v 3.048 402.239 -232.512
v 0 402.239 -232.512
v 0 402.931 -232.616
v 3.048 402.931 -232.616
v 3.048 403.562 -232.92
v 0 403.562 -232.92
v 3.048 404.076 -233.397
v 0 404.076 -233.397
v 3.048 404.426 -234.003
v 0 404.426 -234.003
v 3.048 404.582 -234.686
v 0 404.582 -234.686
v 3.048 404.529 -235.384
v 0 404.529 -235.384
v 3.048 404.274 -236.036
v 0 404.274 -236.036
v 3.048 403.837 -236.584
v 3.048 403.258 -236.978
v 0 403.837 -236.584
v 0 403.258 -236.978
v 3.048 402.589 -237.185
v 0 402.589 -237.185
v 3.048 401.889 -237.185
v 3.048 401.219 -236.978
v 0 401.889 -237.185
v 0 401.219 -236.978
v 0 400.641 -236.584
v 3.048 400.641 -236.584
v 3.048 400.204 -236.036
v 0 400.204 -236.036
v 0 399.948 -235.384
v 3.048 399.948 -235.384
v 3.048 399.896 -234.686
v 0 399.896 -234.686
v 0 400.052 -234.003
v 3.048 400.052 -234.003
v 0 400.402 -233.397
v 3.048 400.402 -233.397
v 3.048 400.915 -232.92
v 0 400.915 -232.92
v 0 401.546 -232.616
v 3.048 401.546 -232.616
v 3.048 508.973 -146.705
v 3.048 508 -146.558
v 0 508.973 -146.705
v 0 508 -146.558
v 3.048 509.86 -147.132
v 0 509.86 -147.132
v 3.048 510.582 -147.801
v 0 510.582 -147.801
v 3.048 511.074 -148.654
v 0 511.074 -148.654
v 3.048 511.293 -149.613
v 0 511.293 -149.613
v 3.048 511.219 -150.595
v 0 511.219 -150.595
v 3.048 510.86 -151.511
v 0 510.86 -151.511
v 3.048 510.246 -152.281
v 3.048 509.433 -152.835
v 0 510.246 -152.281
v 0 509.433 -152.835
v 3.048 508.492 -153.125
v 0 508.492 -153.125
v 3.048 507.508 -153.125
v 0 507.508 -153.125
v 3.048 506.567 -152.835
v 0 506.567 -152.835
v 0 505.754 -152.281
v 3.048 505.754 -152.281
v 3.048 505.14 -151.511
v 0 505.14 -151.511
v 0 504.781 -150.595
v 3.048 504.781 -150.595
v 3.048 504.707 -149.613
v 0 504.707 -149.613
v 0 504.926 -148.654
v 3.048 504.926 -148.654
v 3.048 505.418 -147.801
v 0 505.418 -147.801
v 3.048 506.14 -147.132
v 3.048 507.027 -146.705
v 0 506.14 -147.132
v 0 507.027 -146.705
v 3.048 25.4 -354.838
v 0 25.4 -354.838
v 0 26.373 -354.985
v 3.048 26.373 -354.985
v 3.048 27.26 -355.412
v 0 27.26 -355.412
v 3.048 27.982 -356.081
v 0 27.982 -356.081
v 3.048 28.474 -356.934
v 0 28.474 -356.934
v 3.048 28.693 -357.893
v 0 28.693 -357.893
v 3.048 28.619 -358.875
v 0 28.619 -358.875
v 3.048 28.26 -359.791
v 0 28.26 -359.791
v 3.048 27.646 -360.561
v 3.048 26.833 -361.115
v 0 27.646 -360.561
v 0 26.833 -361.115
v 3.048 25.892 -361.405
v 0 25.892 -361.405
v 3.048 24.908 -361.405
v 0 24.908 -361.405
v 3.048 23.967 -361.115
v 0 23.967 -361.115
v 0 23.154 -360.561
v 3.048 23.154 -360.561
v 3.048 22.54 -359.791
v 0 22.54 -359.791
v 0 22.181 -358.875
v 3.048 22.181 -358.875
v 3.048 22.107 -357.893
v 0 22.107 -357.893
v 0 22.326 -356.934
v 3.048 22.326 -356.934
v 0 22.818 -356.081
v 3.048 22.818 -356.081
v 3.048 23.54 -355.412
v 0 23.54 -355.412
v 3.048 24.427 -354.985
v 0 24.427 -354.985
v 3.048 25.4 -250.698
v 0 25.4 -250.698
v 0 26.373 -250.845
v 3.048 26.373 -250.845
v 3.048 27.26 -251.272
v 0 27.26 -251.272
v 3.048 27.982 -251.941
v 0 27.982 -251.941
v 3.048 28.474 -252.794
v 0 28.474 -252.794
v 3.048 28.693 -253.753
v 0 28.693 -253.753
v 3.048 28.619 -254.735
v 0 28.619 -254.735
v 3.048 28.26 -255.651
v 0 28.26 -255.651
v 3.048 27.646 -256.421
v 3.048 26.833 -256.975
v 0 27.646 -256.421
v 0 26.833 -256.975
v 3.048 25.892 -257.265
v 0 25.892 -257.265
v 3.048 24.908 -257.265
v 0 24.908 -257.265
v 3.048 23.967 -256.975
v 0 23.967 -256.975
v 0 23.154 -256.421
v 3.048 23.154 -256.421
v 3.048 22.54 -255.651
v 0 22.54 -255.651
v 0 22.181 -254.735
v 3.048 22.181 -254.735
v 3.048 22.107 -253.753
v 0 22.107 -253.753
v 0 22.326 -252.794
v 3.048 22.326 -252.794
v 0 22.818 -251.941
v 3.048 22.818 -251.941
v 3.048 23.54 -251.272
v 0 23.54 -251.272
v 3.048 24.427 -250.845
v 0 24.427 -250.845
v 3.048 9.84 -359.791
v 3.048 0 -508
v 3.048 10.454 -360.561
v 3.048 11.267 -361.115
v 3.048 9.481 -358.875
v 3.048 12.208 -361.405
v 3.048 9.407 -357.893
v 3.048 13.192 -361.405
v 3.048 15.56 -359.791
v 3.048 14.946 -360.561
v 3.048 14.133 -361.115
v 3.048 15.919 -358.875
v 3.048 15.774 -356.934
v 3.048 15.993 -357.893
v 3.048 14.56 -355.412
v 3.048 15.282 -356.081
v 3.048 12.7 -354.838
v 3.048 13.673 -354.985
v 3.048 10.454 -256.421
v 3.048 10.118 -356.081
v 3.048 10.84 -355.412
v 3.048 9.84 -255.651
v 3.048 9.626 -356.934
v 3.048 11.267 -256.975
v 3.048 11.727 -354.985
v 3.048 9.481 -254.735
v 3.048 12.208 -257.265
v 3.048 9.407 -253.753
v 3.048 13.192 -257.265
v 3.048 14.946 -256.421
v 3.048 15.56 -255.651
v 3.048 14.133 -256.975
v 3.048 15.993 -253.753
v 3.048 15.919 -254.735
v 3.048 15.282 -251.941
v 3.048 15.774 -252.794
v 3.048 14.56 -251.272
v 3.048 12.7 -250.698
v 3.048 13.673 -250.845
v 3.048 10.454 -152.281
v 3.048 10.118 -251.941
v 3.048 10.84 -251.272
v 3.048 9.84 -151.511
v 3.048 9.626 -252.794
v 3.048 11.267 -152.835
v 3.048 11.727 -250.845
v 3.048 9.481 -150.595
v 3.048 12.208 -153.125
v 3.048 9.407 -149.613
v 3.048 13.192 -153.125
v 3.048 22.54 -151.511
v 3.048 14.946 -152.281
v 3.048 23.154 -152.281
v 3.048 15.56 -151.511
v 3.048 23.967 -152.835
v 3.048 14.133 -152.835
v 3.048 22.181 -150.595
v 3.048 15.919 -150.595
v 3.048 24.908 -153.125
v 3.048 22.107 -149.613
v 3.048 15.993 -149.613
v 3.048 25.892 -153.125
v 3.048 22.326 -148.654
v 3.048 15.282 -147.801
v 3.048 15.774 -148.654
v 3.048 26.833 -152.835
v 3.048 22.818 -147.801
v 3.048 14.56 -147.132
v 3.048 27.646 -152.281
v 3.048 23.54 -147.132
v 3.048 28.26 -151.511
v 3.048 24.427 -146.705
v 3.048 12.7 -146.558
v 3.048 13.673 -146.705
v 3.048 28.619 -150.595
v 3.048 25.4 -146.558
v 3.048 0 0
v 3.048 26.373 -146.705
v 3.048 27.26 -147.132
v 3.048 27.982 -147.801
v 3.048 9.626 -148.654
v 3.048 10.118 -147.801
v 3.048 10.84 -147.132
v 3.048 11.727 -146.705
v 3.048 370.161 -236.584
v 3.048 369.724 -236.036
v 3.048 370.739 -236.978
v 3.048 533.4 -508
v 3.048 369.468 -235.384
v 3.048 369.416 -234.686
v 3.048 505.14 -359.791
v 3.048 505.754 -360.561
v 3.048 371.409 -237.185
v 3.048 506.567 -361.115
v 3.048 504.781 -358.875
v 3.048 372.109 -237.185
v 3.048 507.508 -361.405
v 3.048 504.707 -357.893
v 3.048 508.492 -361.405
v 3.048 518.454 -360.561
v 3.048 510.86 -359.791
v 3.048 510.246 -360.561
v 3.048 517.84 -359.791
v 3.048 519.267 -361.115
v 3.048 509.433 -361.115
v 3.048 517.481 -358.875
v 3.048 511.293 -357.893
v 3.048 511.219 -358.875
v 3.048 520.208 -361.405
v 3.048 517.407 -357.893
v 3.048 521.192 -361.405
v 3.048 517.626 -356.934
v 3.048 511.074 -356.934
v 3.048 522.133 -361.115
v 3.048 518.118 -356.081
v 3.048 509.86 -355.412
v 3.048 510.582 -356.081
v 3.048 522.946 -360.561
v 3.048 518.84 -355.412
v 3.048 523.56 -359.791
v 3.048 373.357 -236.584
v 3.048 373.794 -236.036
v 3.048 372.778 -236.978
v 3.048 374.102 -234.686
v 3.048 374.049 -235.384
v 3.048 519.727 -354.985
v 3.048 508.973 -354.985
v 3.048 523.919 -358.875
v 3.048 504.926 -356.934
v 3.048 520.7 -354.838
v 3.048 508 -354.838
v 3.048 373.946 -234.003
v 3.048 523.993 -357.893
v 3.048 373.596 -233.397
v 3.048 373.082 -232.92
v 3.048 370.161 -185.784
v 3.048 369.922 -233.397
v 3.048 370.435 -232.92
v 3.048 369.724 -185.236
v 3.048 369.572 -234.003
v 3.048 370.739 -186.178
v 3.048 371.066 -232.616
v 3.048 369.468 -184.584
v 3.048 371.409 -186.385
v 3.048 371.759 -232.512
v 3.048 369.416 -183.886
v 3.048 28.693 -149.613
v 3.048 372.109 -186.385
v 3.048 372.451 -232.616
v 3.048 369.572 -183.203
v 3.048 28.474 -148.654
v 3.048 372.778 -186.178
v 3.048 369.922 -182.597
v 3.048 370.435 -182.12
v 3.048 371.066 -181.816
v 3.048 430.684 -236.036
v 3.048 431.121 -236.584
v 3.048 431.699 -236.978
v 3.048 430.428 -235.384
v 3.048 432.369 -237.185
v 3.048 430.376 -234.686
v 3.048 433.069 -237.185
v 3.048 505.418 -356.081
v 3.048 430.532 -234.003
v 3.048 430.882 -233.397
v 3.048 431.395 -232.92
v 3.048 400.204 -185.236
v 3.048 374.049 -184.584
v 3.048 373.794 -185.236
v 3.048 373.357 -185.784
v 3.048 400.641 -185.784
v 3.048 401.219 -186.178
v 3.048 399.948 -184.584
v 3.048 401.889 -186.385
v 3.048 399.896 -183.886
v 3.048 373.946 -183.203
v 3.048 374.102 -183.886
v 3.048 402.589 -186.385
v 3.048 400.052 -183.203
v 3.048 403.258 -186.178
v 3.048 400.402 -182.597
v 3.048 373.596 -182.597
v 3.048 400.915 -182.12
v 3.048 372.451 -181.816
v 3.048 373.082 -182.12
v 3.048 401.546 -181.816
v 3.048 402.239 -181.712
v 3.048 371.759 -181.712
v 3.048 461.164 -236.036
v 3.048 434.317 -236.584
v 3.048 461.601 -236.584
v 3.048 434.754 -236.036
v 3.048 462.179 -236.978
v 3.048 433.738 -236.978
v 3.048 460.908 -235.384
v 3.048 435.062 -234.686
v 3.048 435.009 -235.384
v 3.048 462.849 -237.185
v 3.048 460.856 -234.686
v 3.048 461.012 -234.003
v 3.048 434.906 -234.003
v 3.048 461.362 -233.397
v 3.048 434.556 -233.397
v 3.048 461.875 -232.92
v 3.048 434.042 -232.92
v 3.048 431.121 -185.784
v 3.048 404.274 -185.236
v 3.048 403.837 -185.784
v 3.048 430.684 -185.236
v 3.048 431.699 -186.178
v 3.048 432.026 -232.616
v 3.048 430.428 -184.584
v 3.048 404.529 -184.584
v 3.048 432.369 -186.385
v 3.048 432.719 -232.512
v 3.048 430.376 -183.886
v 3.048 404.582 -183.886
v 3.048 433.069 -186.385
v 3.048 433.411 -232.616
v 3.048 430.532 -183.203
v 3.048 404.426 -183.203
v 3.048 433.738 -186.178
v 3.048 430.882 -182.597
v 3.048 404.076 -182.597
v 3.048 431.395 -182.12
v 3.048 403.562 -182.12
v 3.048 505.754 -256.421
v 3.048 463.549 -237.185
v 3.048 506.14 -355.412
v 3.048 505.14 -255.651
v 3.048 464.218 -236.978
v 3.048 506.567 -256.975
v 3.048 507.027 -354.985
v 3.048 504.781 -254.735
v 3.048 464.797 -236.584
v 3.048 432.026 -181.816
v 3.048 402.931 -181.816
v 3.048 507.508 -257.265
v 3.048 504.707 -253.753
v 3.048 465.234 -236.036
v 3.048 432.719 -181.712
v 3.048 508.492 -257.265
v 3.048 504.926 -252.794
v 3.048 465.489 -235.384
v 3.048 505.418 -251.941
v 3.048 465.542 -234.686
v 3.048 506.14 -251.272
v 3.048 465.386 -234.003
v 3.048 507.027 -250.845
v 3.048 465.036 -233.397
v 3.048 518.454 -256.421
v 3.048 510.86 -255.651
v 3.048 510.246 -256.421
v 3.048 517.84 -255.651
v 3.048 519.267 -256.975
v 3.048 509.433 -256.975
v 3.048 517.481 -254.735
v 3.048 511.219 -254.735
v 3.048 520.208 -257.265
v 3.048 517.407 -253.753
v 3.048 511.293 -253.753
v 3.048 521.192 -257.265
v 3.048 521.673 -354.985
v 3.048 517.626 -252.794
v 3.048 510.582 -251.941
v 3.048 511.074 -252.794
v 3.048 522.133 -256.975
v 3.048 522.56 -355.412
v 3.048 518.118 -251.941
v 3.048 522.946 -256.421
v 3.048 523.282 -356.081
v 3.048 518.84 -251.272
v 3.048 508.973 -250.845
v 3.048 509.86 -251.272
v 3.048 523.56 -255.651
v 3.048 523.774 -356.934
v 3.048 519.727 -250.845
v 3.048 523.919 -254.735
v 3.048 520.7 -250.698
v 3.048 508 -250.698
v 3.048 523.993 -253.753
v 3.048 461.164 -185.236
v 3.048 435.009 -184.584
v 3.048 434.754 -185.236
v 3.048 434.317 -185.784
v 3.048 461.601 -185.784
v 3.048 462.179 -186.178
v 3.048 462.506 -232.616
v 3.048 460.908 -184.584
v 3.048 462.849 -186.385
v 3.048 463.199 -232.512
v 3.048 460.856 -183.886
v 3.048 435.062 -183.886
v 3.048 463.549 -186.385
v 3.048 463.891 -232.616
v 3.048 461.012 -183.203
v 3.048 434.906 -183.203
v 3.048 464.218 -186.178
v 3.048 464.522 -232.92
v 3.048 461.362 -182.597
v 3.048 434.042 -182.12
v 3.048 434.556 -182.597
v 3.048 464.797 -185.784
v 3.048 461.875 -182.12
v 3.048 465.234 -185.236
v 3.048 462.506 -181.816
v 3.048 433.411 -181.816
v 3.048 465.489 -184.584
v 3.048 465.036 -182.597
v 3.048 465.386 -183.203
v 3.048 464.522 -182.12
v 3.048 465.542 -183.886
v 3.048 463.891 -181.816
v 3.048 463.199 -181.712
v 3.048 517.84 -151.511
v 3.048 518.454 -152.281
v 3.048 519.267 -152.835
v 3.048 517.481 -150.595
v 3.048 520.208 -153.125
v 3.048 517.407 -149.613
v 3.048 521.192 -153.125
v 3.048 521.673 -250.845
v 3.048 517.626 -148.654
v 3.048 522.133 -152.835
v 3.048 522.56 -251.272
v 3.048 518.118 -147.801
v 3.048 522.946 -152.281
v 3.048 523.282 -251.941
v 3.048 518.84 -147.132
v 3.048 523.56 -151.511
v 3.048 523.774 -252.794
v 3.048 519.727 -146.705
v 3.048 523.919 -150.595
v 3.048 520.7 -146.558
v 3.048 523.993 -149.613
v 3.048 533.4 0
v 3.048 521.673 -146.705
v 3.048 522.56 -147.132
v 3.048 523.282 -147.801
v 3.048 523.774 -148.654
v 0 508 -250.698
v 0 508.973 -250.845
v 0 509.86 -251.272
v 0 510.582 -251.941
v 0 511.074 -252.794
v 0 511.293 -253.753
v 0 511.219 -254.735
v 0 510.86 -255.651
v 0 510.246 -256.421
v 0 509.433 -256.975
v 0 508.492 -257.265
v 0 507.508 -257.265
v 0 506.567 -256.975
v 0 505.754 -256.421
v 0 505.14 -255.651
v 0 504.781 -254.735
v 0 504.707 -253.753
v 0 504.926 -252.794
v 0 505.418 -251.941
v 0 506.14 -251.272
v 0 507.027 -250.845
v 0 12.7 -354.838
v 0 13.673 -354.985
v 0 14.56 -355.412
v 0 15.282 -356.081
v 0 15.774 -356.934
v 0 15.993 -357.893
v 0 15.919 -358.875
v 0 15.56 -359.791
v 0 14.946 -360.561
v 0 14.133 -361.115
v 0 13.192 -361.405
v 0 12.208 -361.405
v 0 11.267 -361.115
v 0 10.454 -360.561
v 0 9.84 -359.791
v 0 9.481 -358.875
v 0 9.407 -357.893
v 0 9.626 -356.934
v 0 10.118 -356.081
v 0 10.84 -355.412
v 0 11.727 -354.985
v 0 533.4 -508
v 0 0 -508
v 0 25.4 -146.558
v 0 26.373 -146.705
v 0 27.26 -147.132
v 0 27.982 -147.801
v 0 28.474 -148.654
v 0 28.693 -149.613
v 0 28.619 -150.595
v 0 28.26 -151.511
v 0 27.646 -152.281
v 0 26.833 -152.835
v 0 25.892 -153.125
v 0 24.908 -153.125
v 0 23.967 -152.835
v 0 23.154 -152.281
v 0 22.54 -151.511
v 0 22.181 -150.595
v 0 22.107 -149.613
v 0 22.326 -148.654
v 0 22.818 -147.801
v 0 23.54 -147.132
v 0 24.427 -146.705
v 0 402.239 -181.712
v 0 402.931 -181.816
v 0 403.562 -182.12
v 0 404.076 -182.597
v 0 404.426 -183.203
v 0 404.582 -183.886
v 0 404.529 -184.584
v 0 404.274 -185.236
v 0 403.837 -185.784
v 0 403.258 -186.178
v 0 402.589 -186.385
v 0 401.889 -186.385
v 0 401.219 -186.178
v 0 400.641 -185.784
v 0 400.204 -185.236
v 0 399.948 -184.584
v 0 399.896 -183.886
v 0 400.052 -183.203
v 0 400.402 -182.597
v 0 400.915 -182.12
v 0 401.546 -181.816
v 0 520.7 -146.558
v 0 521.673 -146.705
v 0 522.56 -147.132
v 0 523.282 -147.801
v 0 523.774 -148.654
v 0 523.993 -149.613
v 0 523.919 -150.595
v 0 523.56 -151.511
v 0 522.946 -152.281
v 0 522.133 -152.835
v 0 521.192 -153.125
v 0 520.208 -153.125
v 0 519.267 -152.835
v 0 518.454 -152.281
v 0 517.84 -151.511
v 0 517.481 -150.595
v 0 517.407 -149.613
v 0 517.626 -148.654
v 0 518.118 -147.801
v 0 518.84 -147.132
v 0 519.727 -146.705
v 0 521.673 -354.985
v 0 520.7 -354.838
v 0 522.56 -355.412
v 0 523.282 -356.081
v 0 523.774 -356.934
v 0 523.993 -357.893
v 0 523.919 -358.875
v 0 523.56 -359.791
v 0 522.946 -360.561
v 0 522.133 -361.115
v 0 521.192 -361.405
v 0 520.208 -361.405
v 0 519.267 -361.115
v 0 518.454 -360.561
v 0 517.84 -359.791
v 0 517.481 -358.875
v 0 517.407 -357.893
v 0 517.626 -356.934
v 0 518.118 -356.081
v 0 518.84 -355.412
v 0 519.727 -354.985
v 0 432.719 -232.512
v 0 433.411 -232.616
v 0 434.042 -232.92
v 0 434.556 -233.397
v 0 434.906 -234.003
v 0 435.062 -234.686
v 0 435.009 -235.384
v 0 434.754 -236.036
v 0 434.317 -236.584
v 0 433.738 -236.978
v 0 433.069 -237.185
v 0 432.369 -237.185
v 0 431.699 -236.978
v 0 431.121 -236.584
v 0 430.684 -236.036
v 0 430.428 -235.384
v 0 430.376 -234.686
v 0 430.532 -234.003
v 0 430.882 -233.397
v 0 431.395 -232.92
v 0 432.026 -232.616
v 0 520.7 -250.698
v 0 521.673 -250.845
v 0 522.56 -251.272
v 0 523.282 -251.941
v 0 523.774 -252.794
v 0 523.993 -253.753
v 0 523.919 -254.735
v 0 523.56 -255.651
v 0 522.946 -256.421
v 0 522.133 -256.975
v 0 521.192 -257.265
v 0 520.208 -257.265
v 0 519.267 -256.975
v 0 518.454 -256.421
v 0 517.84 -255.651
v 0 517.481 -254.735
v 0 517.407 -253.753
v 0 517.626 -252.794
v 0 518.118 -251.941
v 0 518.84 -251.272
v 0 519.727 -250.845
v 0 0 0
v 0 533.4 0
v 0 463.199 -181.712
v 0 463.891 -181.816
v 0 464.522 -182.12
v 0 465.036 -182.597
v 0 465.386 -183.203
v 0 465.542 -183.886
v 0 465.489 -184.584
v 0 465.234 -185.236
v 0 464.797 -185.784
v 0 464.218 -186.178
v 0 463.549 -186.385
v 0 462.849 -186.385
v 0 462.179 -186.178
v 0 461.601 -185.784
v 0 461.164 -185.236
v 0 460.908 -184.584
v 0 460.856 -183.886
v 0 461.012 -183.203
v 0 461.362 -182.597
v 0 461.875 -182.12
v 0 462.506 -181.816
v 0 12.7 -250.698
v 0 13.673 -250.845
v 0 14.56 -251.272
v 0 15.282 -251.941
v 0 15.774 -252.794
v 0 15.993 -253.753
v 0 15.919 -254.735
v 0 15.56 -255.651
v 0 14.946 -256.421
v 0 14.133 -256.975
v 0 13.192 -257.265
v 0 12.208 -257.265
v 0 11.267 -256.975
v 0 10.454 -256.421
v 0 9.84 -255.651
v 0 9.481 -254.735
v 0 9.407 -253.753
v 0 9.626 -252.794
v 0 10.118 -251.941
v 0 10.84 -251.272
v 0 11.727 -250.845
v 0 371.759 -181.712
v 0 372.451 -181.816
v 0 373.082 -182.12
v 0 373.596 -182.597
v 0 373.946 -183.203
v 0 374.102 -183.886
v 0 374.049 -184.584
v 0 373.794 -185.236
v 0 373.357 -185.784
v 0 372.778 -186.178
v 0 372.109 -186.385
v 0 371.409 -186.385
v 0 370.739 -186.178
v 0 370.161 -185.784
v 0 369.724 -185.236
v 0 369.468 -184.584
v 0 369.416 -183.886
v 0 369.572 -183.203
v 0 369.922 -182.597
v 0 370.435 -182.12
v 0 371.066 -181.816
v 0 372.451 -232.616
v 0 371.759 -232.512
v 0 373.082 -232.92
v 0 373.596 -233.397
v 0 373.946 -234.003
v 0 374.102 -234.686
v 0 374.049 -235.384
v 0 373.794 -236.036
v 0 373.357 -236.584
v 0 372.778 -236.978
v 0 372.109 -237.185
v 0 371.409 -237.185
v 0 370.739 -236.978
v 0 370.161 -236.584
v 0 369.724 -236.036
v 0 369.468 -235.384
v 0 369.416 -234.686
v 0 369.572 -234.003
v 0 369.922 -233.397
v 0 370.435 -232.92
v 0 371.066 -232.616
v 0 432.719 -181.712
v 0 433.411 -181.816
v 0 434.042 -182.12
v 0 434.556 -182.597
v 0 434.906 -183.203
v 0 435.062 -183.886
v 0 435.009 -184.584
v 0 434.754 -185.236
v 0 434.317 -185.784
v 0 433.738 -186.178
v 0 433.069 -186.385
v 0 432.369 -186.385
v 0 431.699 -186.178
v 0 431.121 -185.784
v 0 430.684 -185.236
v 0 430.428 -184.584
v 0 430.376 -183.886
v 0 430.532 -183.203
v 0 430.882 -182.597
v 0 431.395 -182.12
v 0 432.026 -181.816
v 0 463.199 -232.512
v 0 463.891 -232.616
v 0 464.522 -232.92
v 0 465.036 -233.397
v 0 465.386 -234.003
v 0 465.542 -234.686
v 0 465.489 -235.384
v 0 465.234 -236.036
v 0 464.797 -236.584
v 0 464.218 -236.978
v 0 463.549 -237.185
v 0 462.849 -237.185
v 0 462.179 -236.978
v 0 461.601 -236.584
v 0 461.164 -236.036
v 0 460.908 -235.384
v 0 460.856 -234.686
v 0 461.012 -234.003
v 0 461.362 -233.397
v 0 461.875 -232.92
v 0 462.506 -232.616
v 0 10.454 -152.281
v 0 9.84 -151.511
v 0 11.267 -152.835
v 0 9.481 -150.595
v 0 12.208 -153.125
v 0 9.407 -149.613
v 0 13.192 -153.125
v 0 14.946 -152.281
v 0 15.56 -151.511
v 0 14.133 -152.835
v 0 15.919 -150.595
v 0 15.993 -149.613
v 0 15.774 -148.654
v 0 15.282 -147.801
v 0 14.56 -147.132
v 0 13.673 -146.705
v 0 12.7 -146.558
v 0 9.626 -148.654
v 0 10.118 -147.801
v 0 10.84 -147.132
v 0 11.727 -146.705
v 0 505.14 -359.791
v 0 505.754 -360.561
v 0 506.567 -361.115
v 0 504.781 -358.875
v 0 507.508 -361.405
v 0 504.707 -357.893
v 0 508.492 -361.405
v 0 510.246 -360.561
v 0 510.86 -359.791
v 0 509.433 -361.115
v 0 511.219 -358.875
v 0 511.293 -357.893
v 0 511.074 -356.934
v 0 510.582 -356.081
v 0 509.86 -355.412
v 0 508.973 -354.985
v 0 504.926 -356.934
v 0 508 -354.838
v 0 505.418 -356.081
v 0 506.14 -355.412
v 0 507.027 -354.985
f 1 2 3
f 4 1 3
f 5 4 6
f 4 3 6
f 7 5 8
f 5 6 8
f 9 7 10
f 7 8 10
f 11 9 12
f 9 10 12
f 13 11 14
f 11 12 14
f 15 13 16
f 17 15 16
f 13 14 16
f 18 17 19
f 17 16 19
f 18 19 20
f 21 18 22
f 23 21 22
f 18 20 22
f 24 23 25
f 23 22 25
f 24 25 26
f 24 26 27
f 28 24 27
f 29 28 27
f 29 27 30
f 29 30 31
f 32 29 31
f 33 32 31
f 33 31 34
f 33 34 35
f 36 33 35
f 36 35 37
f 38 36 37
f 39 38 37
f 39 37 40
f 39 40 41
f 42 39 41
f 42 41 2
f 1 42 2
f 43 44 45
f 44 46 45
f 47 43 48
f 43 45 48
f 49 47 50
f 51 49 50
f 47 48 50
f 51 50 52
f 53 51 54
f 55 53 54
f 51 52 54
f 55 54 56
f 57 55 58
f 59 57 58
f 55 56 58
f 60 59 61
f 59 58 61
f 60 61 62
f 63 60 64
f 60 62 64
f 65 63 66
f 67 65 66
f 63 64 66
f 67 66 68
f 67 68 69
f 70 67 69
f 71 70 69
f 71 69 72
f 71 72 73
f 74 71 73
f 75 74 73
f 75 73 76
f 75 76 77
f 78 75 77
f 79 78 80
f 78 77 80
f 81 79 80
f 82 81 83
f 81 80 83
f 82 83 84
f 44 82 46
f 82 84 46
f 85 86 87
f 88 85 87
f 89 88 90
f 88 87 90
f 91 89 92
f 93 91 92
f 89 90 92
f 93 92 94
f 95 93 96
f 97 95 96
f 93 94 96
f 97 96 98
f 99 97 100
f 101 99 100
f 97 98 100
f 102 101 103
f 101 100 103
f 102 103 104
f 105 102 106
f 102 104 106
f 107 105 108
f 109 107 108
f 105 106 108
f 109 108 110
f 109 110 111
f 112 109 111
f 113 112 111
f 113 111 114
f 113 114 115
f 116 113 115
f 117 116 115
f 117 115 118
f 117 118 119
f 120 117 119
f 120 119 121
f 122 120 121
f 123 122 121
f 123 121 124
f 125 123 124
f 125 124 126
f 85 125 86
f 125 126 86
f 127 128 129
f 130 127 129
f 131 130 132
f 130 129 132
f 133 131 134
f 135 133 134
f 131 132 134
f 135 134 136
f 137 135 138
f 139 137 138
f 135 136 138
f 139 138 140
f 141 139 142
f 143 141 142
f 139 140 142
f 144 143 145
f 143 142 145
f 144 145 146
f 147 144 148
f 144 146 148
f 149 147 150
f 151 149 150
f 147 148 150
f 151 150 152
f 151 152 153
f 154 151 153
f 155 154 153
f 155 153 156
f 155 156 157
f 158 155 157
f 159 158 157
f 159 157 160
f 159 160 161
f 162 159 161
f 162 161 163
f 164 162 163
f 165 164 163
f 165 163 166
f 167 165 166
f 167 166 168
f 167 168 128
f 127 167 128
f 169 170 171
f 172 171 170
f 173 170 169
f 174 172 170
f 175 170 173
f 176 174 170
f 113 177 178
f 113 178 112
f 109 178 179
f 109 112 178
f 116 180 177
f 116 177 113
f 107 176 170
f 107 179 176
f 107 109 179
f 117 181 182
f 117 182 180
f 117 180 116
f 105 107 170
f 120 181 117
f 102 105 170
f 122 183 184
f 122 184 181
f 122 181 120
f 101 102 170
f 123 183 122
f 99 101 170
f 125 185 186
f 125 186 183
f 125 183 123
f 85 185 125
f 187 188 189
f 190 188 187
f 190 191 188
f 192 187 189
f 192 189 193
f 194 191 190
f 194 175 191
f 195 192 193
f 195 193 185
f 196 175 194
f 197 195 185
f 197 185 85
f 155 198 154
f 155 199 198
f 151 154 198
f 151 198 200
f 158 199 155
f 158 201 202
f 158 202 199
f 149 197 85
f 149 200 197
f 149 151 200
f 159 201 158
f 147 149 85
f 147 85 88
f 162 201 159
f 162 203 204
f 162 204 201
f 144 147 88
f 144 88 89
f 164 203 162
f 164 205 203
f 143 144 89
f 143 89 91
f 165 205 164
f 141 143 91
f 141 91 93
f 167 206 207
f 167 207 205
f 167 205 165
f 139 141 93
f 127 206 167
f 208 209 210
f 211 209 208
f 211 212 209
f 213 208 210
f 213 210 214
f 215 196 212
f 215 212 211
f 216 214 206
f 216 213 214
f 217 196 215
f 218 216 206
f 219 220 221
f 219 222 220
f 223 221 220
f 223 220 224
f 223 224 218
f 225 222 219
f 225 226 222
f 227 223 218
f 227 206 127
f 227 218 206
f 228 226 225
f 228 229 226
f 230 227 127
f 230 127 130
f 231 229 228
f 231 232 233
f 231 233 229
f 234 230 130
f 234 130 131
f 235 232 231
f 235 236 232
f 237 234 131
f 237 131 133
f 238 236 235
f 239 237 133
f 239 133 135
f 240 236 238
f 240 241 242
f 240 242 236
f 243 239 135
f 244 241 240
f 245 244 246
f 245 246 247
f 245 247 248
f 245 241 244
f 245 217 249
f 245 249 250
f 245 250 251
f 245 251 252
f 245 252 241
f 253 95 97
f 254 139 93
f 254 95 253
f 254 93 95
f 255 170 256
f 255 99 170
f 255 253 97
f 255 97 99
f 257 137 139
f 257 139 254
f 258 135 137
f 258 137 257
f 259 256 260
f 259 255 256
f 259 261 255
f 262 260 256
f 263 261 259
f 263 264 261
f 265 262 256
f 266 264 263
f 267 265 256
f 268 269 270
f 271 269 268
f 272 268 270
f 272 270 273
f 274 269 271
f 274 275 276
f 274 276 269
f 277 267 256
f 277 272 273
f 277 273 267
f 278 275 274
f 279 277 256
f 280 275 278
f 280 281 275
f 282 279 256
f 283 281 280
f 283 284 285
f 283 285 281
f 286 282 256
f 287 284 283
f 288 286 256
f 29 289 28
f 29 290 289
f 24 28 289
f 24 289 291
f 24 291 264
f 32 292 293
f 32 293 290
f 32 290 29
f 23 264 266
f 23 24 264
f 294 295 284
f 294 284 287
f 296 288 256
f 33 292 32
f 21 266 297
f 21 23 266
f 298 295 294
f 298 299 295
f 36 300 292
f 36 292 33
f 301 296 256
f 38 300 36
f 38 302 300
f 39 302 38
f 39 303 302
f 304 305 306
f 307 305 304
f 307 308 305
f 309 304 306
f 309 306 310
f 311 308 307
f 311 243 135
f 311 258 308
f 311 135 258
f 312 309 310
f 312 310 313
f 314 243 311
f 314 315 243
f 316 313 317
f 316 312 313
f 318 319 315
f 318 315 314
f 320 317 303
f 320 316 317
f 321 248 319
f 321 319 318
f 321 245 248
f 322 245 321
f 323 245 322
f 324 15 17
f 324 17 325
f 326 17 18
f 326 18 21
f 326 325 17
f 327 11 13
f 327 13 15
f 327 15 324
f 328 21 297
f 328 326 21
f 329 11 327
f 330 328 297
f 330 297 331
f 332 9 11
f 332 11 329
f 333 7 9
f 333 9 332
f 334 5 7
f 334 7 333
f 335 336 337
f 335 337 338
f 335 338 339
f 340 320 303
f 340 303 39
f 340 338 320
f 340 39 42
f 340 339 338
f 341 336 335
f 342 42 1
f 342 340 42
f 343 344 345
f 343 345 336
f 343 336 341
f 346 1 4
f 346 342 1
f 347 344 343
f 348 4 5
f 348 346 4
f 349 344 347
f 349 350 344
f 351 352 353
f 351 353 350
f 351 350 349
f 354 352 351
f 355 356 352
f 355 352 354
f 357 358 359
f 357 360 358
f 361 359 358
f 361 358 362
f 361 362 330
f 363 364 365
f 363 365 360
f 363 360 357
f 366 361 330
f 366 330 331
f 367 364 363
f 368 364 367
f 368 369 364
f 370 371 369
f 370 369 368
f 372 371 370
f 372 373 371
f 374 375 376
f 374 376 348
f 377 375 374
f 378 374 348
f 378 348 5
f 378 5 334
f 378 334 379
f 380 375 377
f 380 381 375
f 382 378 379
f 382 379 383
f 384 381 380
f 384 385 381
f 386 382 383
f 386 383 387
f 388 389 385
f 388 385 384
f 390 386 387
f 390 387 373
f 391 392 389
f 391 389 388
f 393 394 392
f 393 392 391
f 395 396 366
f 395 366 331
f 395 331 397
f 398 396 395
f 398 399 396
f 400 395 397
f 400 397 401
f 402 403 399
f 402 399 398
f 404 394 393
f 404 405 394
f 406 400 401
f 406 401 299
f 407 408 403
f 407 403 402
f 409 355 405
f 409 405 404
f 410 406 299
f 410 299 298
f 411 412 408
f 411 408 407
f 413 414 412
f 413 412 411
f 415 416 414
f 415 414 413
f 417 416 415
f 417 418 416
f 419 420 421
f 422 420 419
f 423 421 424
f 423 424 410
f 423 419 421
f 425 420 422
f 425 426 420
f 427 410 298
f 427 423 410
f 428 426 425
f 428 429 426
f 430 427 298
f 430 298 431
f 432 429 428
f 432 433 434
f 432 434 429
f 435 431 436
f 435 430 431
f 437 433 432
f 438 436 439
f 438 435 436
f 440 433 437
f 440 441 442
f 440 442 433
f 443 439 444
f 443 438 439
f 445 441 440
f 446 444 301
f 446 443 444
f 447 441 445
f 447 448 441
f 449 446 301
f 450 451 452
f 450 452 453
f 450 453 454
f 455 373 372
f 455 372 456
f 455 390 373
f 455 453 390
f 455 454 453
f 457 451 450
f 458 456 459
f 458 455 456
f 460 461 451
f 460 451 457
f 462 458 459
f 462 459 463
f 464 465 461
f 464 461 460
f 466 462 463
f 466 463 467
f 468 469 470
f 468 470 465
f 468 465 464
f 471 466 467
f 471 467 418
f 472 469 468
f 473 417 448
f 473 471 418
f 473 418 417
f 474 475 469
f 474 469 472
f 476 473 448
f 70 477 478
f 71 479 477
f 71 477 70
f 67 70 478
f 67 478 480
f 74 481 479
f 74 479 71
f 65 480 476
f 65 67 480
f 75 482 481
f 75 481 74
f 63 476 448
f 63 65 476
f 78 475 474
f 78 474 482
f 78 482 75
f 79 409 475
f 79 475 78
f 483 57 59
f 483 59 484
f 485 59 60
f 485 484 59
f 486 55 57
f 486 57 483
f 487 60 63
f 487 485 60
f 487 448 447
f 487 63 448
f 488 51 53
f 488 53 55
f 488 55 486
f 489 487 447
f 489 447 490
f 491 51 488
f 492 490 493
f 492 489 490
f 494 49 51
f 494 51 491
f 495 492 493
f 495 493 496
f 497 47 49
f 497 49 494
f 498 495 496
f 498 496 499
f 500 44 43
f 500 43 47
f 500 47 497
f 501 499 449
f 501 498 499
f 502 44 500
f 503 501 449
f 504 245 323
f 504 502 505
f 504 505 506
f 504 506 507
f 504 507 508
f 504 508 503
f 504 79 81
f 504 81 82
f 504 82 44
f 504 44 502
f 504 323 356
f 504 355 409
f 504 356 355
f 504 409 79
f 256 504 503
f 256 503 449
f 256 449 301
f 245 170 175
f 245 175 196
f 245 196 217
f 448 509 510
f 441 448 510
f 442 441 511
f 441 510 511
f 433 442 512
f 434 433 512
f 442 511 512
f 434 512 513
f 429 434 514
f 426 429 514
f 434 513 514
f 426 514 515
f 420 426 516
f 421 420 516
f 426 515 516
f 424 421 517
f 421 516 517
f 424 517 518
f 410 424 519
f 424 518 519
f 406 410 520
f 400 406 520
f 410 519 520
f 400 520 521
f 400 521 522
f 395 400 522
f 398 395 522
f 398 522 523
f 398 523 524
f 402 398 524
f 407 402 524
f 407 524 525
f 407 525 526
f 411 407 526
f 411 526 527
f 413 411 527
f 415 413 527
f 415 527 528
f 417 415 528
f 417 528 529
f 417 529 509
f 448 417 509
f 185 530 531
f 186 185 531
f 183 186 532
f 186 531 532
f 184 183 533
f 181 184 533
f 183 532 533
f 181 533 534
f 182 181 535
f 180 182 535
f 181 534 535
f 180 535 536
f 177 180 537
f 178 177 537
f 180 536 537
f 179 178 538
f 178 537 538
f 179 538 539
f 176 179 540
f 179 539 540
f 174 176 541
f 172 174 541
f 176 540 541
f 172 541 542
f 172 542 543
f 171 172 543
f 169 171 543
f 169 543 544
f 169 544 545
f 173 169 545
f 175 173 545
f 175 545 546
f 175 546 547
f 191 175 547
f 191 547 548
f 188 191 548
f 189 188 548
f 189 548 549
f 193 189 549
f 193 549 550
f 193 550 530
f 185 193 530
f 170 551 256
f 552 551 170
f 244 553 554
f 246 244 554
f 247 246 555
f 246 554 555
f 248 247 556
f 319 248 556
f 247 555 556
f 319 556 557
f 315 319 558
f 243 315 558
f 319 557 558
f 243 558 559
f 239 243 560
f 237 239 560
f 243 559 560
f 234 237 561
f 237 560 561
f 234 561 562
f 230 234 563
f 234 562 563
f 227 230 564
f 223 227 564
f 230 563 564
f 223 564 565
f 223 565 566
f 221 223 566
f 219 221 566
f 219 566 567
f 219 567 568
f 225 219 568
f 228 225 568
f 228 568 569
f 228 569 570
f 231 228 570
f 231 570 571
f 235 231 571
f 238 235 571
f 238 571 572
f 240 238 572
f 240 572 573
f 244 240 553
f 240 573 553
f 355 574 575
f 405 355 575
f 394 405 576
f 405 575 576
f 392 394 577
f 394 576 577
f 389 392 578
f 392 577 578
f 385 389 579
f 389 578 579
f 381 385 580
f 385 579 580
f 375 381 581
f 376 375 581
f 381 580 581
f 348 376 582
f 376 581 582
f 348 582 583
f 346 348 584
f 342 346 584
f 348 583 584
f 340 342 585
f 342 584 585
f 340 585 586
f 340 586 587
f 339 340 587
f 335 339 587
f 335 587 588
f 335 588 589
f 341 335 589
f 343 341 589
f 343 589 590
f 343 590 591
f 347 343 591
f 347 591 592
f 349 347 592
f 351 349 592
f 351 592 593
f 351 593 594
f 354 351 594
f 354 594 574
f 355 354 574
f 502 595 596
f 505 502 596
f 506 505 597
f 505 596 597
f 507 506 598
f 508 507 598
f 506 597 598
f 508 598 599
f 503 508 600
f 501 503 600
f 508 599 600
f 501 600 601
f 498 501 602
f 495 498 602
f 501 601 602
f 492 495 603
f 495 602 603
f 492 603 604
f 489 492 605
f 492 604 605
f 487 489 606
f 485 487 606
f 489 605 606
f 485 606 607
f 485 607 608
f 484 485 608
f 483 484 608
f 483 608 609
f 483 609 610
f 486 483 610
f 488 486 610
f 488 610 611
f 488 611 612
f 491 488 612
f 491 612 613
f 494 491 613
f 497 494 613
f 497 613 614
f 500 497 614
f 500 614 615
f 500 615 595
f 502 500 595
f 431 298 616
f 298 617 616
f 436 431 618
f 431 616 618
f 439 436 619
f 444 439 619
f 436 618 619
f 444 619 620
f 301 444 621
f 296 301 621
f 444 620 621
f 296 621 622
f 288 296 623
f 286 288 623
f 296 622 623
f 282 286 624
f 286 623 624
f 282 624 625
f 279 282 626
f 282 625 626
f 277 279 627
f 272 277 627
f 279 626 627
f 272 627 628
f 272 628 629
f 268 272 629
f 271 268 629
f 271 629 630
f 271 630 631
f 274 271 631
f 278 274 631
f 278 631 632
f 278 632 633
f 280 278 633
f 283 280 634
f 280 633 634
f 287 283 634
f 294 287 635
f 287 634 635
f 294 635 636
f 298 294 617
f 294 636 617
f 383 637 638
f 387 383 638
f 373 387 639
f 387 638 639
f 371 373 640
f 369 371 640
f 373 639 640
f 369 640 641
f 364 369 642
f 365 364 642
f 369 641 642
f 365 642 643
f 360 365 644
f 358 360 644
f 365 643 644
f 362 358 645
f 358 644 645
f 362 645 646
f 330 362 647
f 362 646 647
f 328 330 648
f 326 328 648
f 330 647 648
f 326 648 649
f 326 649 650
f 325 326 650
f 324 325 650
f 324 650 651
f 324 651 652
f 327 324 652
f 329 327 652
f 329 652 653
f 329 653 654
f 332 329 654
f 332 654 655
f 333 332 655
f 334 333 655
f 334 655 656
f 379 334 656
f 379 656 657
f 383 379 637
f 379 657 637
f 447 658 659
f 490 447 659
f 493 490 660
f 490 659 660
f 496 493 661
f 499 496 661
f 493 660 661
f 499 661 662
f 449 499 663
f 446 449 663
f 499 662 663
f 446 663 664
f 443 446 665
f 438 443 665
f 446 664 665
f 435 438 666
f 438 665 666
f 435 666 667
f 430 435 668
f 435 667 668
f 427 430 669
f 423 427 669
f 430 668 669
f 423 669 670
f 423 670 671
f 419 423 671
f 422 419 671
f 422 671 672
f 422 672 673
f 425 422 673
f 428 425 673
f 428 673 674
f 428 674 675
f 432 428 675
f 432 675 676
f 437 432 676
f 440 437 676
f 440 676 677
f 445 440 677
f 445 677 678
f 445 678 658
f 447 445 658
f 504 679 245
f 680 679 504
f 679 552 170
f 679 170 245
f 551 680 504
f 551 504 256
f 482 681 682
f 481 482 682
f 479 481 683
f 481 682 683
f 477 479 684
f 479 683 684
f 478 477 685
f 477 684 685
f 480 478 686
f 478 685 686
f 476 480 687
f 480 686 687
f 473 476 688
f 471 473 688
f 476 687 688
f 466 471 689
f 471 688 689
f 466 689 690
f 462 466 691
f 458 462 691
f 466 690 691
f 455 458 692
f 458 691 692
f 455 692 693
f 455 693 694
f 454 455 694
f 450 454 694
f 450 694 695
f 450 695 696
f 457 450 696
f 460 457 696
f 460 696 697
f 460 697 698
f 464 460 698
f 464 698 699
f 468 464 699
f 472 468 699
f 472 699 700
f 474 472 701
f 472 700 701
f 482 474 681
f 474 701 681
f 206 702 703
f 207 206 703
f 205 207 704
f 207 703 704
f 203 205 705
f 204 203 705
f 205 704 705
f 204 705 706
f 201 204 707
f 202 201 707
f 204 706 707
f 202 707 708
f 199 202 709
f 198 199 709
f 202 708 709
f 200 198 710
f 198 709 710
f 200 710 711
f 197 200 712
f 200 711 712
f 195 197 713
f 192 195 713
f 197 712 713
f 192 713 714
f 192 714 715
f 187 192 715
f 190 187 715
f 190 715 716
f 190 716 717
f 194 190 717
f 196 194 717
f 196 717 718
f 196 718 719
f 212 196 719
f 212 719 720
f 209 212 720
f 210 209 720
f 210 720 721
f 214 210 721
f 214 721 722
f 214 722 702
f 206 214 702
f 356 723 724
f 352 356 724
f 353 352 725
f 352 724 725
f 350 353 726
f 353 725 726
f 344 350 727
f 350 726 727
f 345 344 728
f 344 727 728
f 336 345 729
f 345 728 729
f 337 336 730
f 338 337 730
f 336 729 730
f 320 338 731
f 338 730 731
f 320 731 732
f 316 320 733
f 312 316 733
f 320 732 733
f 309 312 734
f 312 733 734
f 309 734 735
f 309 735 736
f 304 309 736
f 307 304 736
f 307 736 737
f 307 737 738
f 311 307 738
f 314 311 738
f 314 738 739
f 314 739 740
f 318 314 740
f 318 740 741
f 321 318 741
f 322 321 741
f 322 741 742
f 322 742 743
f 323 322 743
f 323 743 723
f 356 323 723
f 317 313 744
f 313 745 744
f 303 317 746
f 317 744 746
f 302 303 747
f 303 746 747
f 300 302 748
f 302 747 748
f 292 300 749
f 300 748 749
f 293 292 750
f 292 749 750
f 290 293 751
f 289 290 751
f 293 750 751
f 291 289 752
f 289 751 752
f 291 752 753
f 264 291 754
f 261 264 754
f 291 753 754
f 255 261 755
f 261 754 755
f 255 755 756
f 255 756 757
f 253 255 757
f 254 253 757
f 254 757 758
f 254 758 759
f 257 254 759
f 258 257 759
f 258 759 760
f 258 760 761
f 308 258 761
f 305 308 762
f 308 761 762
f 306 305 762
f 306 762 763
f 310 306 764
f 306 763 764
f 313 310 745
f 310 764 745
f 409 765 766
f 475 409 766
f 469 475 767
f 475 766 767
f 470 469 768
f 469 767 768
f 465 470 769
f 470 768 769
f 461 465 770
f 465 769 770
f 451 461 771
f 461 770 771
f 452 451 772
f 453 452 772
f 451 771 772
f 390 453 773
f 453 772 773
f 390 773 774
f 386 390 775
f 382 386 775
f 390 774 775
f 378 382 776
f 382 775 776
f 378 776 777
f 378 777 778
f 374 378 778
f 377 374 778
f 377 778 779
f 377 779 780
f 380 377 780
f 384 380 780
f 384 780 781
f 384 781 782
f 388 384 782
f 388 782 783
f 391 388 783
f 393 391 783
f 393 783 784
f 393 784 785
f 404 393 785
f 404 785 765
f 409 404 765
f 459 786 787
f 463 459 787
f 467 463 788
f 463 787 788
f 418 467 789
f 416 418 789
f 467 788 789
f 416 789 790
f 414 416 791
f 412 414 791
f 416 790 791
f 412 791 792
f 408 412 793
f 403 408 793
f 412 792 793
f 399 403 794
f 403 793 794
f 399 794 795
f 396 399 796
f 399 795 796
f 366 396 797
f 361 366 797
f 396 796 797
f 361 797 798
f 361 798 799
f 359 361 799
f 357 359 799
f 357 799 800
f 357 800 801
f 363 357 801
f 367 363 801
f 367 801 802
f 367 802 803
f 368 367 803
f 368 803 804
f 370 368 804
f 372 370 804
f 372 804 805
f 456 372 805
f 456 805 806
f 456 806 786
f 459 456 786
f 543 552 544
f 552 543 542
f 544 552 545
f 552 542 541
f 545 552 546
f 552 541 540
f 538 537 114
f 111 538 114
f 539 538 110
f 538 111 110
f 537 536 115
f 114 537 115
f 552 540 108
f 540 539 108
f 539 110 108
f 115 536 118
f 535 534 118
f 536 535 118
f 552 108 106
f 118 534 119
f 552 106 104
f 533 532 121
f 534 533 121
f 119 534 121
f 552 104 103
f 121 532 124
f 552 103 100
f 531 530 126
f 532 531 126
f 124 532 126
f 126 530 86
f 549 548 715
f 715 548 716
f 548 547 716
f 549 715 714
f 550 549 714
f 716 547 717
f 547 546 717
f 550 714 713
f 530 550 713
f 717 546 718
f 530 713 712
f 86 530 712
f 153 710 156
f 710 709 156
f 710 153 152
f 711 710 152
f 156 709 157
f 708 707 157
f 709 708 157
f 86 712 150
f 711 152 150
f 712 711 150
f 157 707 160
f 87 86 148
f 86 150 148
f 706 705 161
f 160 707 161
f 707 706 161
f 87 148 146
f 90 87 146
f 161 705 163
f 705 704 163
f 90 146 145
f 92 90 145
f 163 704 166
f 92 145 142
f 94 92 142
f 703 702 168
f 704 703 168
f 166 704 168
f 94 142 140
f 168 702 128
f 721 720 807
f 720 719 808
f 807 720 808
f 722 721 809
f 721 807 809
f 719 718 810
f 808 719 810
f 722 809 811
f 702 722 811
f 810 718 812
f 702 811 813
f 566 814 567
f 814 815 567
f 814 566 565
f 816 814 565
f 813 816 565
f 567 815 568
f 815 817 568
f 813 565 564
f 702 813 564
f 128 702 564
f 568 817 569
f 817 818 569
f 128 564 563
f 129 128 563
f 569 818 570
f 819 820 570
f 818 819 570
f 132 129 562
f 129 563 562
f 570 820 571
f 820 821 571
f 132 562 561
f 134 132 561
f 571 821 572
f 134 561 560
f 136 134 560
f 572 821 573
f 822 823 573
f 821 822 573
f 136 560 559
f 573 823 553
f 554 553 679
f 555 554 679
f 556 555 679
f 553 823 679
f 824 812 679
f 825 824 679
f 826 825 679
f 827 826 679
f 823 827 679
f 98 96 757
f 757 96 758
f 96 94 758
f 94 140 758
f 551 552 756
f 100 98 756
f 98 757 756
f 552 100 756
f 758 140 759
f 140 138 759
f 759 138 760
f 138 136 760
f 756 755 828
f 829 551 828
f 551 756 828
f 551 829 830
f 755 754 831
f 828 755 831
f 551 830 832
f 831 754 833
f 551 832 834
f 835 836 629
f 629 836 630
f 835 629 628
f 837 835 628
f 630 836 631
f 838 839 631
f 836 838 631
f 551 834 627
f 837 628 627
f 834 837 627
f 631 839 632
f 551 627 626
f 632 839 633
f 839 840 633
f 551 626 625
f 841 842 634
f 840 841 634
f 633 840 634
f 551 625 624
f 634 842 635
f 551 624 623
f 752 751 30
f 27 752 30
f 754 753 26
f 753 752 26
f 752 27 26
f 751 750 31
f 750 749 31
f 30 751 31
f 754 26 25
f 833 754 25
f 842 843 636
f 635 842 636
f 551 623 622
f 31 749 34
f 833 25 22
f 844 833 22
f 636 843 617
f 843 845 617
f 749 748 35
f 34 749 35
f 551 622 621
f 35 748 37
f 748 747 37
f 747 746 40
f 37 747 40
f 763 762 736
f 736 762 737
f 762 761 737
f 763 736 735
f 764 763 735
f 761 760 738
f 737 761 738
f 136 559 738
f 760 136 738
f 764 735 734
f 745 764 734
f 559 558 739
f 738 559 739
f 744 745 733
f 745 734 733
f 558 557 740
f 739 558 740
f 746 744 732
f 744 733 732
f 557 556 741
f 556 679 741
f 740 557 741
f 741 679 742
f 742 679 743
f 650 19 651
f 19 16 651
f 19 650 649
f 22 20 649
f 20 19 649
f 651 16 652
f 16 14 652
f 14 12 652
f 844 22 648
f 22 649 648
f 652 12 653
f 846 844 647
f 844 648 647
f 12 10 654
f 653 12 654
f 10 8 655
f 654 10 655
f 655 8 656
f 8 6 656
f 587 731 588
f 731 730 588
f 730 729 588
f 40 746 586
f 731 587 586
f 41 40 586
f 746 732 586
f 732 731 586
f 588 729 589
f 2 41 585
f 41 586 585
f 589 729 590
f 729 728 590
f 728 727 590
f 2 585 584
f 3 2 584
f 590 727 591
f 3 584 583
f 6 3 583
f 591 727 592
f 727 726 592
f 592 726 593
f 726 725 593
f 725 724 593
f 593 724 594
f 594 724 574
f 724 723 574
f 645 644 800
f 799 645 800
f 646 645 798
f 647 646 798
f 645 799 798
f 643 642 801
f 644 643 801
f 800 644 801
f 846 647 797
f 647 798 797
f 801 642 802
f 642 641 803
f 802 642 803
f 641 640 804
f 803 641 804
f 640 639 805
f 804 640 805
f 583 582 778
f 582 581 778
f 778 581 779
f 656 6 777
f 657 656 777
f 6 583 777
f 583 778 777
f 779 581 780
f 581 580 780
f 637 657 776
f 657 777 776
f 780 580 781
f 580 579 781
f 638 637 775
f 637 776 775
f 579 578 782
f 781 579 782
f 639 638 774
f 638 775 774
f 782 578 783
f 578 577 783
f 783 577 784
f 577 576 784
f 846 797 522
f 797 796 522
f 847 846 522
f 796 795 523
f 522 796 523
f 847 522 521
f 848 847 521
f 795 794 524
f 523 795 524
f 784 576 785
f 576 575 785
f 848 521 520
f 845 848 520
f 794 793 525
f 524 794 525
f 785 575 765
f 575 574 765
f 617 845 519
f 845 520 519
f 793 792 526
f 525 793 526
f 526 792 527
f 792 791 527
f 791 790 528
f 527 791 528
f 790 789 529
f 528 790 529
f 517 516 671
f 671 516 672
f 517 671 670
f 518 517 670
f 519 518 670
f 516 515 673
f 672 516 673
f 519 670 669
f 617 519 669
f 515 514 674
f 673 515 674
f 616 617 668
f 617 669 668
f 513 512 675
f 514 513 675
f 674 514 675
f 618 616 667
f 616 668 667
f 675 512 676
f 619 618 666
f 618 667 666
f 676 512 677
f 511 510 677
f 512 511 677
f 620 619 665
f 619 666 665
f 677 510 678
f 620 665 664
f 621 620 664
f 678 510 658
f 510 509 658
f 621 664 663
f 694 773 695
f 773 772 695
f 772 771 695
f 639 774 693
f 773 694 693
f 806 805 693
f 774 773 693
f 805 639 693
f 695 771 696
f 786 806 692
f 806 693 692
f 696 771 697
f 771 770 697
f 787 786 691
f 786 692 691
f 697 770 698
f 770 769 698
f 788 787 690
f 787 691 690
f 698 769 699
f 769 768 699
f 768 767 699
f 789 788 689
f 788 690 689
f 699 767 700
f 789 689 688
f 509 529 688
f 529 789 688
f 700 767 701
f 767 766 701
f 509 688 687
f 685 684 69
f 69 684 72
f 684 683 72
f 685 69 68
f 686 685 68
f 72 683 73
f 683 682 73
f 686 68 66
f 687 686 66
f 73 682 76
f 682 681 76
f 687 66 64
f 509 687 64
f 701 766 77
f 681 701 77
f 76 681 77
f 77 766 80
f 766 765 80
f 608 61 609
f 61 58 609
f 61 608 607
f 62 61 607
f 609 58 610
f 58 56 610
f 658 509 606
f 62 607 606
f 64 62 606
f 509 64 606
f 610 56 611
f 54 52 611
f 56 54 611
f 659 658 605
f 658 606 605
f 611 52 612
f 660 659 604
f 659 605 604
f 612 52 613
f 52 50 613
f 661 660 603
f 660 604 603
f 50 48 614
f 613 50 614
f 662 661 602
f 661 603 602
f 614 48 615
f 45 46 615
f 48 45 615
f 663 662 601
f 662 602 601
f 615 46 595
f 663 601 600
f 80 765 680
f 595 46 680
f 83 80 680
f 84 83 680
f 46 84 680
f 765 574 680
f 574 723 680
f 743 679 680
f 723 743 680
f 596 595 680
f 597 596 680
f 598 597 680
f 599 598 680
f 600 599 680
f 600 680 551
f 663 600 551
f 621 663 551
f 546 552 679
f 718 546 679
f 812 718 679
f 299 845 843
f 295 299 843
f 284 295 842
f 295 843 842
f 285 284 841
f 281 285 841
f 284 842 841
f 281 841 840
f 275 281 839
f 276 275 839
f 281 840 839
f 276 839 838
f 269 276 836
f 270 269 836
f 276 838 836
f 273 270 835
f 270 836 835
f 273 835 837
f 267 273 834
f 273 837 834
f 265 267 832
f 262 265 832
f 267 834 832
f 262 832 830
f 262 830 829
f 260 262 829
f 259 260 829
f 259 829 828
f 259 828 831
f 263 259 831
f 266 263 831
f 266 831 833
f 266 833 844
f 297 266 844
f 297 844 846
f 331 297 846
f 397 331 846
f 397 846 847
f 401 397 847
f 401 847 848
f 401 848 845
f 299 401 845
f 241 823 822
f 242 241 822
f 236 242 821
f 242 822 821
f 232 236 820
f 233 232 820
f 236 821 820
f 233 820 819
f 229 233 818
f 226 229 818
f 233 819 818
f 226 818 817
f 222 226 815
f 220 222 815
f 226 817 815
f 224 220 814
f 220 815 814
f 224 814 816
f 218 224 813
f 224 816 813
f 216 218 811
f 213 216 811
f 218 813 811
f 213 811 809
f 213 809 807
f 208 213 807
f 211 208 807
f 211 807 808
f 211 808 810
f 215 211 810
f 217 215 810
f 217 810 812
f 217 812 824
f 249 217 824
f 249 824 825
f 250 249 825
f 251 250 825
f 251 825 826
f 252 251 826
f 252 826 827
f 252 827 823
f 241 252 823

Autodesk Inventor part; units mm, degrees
ref_plane "YZ Plane" through (0, 0, 0) normal (1, 0, 0) x (0, 1, 0)
ref_plane "XZ Plane" through (0, 0, 0) normal (0, 1, 0) x (-1, 0, 0)
ref_plane "XY Plane" through (0, 0, 0) normal (0, 0, 1) x (1, 0, 0)
sketch "Sketch1" plane through (0, 0, 0) normal (1, 0, 0) x (0, 1, 0)
  line L0 (0, 0) -> (533.4, 0)
  line L1 (533.4, 0) -> (533.4, -508)
  line L2 (533.4, -508) -> (0, -508)
  line L3 (0, -508) -> (0, 0)
  dimension "d0" = 533.4
  dimension "d1" = 508
extrude "Extrusion1" add sketch "Sketch1" along normal blind 1.5875
sketch "Sketch3" plane through (0, 0, 0) normal (-1, 0, 0) x (0, 0, 1)
  line L0 (-508, 0) -> (-508, 533.4) projected
  line L1 (0, 0) -> (-508, 0) projected
  circle A0 centre (-358.14, 12.7) radius 3.302
  circle A1 centre (-358.14, 25.4) radius 3.302
  circle A2 centre (-149.86, 12.7) radius 3.302
  circle A3 centre (-149.86, 25.4) radius 3.302
  circle A4 centre (-254, 12.7) radius 3.302
  circle A5 centre (-254, 25.4) radius 3.302
  circle A6 centre (-358.14, 508) radius 3.302
  circle A7 centre (-358.14, 520.7) radius 3.302
  circle A8 centre (-149.86, 508) radius 3.302
  circle A9 centre (-149.86, 520.7) radius 3.302
  circle A10 centre (-254, 508) radius 3.302
  circle A11 centre (-254, 520.7) radius 3.302
extrude "Extrusion5" cut sketch "Sketch3" against normal up to surface (1.5875 mm away) contours A0 | A1 | A2 | A3 | A4 | A5
sheet face with bend "Face1" sketch "Sketch1" thickness 3.048 toward (1, 0, 0) bend radius 3.048
bend "Bend1"
extrude "Cut1" cut sketch "Sketch3" against normal up to surface (3.048 mm away)
sketch "Sketch4" plane through (0, 0, 0) normal (-1, 0, 0) x (0, 0, 1)
  circle A0 centre (-184.0615, 463.1989) radius 2.3495
  line L0 (-184.0615, 463.1989) -> (-234.8615, 463.1989)
  circle A1 centre (-234.8615, 463.1989) radius 2.3495
  line L1 (-184.0615, 463.1989) -> (-184.0615, 447.9589)
  line L2 (-184.0615, 447.9589) -> (-184.0615, 432.7189)
  circle A2 centre (-184.0615, 432.7189) radius 2.3495
  circle A3 centre (-234.8615, 432.7189) radius 2.3495
  line L3 (-184.0615, 432.7189) -> (-184.0615, 417.4789)
  line L4 (-184.0615, 417.4789) -> (-184.0615, 402.2389)
  line L5 (-184.0615, 402.2389) -> (-234.8615, 402.2389)
  line L6 (-234.8615, 402.2389) -> (-234.8615, 386.9989)
  line L7 (-234.8615, 386.9989) -> (-234.8615, 371.7589)
  line L8 (-234.8615, 371.7589) -> (-184.0615, 371.7589)
  circle A4 centre (-184.0615, 402.2389) radius 2.3495
  circle A5 centre (-234.8615, 402.2389) radius 2.3495
  circle A6 centre (-234.8615, 371.7589) radius 2.3495
  circle A7 centre (-184.0615, 371.7589) radius 2.3495
  point P0 (0, 0)
  dimension "d47" = 50.8
  dimension "d48" = 4.699
  dimension "d49" = 15.24
  dimension "d50" = 15.24
  dimension "d51" = 4.699
  dimension "d52" = 4.699
  dimension "d53" = 15.24
  dimension "d54" = 15.24
  dimension "d55" = 15.24
  dimension "d56" = 15.24
  dimension "d57" = 4.699
  dimension "d58" = 4.699
  dimension "d59" = 4.699
  dimension "d60" = 4.699
extrude "Cut2" cut sketch "Sketch4" against normal blind 3.048
equation "\"d38\" = Thickness"
equation "\"d43\" = Thickness"
equation "\"d32\" = Thickness"
equation "\"d33\" = BendRadius"
equation "\"d34\" = BendReliefWidth"
equation "\"d36\" = MinimumRemnant"
equation "\"d35\" = BendReliefDepth"
equation "\"d37\" = TransitionRadius"
equation "\"BendRadius\" = Thickness"
equation "\"BendReliefWidth\" = Thickness"
equation "\"BendReliefDepth\" = 0.5 * Thickness"
equation "\"CornerReliefSize\" = 4 * Thickness"
equation "\"MinimumRemnant\" = 2 * Thickness"
equation "\"TransitionRadius\" = BendRadius"
equation "\"JacobiRadiusSize\" = BendRadius"
equation "\"GapSize\" = Thickness"
equation "\"Thickness\" = 3.048"
properties part number "BottomV4" material "Steel"
